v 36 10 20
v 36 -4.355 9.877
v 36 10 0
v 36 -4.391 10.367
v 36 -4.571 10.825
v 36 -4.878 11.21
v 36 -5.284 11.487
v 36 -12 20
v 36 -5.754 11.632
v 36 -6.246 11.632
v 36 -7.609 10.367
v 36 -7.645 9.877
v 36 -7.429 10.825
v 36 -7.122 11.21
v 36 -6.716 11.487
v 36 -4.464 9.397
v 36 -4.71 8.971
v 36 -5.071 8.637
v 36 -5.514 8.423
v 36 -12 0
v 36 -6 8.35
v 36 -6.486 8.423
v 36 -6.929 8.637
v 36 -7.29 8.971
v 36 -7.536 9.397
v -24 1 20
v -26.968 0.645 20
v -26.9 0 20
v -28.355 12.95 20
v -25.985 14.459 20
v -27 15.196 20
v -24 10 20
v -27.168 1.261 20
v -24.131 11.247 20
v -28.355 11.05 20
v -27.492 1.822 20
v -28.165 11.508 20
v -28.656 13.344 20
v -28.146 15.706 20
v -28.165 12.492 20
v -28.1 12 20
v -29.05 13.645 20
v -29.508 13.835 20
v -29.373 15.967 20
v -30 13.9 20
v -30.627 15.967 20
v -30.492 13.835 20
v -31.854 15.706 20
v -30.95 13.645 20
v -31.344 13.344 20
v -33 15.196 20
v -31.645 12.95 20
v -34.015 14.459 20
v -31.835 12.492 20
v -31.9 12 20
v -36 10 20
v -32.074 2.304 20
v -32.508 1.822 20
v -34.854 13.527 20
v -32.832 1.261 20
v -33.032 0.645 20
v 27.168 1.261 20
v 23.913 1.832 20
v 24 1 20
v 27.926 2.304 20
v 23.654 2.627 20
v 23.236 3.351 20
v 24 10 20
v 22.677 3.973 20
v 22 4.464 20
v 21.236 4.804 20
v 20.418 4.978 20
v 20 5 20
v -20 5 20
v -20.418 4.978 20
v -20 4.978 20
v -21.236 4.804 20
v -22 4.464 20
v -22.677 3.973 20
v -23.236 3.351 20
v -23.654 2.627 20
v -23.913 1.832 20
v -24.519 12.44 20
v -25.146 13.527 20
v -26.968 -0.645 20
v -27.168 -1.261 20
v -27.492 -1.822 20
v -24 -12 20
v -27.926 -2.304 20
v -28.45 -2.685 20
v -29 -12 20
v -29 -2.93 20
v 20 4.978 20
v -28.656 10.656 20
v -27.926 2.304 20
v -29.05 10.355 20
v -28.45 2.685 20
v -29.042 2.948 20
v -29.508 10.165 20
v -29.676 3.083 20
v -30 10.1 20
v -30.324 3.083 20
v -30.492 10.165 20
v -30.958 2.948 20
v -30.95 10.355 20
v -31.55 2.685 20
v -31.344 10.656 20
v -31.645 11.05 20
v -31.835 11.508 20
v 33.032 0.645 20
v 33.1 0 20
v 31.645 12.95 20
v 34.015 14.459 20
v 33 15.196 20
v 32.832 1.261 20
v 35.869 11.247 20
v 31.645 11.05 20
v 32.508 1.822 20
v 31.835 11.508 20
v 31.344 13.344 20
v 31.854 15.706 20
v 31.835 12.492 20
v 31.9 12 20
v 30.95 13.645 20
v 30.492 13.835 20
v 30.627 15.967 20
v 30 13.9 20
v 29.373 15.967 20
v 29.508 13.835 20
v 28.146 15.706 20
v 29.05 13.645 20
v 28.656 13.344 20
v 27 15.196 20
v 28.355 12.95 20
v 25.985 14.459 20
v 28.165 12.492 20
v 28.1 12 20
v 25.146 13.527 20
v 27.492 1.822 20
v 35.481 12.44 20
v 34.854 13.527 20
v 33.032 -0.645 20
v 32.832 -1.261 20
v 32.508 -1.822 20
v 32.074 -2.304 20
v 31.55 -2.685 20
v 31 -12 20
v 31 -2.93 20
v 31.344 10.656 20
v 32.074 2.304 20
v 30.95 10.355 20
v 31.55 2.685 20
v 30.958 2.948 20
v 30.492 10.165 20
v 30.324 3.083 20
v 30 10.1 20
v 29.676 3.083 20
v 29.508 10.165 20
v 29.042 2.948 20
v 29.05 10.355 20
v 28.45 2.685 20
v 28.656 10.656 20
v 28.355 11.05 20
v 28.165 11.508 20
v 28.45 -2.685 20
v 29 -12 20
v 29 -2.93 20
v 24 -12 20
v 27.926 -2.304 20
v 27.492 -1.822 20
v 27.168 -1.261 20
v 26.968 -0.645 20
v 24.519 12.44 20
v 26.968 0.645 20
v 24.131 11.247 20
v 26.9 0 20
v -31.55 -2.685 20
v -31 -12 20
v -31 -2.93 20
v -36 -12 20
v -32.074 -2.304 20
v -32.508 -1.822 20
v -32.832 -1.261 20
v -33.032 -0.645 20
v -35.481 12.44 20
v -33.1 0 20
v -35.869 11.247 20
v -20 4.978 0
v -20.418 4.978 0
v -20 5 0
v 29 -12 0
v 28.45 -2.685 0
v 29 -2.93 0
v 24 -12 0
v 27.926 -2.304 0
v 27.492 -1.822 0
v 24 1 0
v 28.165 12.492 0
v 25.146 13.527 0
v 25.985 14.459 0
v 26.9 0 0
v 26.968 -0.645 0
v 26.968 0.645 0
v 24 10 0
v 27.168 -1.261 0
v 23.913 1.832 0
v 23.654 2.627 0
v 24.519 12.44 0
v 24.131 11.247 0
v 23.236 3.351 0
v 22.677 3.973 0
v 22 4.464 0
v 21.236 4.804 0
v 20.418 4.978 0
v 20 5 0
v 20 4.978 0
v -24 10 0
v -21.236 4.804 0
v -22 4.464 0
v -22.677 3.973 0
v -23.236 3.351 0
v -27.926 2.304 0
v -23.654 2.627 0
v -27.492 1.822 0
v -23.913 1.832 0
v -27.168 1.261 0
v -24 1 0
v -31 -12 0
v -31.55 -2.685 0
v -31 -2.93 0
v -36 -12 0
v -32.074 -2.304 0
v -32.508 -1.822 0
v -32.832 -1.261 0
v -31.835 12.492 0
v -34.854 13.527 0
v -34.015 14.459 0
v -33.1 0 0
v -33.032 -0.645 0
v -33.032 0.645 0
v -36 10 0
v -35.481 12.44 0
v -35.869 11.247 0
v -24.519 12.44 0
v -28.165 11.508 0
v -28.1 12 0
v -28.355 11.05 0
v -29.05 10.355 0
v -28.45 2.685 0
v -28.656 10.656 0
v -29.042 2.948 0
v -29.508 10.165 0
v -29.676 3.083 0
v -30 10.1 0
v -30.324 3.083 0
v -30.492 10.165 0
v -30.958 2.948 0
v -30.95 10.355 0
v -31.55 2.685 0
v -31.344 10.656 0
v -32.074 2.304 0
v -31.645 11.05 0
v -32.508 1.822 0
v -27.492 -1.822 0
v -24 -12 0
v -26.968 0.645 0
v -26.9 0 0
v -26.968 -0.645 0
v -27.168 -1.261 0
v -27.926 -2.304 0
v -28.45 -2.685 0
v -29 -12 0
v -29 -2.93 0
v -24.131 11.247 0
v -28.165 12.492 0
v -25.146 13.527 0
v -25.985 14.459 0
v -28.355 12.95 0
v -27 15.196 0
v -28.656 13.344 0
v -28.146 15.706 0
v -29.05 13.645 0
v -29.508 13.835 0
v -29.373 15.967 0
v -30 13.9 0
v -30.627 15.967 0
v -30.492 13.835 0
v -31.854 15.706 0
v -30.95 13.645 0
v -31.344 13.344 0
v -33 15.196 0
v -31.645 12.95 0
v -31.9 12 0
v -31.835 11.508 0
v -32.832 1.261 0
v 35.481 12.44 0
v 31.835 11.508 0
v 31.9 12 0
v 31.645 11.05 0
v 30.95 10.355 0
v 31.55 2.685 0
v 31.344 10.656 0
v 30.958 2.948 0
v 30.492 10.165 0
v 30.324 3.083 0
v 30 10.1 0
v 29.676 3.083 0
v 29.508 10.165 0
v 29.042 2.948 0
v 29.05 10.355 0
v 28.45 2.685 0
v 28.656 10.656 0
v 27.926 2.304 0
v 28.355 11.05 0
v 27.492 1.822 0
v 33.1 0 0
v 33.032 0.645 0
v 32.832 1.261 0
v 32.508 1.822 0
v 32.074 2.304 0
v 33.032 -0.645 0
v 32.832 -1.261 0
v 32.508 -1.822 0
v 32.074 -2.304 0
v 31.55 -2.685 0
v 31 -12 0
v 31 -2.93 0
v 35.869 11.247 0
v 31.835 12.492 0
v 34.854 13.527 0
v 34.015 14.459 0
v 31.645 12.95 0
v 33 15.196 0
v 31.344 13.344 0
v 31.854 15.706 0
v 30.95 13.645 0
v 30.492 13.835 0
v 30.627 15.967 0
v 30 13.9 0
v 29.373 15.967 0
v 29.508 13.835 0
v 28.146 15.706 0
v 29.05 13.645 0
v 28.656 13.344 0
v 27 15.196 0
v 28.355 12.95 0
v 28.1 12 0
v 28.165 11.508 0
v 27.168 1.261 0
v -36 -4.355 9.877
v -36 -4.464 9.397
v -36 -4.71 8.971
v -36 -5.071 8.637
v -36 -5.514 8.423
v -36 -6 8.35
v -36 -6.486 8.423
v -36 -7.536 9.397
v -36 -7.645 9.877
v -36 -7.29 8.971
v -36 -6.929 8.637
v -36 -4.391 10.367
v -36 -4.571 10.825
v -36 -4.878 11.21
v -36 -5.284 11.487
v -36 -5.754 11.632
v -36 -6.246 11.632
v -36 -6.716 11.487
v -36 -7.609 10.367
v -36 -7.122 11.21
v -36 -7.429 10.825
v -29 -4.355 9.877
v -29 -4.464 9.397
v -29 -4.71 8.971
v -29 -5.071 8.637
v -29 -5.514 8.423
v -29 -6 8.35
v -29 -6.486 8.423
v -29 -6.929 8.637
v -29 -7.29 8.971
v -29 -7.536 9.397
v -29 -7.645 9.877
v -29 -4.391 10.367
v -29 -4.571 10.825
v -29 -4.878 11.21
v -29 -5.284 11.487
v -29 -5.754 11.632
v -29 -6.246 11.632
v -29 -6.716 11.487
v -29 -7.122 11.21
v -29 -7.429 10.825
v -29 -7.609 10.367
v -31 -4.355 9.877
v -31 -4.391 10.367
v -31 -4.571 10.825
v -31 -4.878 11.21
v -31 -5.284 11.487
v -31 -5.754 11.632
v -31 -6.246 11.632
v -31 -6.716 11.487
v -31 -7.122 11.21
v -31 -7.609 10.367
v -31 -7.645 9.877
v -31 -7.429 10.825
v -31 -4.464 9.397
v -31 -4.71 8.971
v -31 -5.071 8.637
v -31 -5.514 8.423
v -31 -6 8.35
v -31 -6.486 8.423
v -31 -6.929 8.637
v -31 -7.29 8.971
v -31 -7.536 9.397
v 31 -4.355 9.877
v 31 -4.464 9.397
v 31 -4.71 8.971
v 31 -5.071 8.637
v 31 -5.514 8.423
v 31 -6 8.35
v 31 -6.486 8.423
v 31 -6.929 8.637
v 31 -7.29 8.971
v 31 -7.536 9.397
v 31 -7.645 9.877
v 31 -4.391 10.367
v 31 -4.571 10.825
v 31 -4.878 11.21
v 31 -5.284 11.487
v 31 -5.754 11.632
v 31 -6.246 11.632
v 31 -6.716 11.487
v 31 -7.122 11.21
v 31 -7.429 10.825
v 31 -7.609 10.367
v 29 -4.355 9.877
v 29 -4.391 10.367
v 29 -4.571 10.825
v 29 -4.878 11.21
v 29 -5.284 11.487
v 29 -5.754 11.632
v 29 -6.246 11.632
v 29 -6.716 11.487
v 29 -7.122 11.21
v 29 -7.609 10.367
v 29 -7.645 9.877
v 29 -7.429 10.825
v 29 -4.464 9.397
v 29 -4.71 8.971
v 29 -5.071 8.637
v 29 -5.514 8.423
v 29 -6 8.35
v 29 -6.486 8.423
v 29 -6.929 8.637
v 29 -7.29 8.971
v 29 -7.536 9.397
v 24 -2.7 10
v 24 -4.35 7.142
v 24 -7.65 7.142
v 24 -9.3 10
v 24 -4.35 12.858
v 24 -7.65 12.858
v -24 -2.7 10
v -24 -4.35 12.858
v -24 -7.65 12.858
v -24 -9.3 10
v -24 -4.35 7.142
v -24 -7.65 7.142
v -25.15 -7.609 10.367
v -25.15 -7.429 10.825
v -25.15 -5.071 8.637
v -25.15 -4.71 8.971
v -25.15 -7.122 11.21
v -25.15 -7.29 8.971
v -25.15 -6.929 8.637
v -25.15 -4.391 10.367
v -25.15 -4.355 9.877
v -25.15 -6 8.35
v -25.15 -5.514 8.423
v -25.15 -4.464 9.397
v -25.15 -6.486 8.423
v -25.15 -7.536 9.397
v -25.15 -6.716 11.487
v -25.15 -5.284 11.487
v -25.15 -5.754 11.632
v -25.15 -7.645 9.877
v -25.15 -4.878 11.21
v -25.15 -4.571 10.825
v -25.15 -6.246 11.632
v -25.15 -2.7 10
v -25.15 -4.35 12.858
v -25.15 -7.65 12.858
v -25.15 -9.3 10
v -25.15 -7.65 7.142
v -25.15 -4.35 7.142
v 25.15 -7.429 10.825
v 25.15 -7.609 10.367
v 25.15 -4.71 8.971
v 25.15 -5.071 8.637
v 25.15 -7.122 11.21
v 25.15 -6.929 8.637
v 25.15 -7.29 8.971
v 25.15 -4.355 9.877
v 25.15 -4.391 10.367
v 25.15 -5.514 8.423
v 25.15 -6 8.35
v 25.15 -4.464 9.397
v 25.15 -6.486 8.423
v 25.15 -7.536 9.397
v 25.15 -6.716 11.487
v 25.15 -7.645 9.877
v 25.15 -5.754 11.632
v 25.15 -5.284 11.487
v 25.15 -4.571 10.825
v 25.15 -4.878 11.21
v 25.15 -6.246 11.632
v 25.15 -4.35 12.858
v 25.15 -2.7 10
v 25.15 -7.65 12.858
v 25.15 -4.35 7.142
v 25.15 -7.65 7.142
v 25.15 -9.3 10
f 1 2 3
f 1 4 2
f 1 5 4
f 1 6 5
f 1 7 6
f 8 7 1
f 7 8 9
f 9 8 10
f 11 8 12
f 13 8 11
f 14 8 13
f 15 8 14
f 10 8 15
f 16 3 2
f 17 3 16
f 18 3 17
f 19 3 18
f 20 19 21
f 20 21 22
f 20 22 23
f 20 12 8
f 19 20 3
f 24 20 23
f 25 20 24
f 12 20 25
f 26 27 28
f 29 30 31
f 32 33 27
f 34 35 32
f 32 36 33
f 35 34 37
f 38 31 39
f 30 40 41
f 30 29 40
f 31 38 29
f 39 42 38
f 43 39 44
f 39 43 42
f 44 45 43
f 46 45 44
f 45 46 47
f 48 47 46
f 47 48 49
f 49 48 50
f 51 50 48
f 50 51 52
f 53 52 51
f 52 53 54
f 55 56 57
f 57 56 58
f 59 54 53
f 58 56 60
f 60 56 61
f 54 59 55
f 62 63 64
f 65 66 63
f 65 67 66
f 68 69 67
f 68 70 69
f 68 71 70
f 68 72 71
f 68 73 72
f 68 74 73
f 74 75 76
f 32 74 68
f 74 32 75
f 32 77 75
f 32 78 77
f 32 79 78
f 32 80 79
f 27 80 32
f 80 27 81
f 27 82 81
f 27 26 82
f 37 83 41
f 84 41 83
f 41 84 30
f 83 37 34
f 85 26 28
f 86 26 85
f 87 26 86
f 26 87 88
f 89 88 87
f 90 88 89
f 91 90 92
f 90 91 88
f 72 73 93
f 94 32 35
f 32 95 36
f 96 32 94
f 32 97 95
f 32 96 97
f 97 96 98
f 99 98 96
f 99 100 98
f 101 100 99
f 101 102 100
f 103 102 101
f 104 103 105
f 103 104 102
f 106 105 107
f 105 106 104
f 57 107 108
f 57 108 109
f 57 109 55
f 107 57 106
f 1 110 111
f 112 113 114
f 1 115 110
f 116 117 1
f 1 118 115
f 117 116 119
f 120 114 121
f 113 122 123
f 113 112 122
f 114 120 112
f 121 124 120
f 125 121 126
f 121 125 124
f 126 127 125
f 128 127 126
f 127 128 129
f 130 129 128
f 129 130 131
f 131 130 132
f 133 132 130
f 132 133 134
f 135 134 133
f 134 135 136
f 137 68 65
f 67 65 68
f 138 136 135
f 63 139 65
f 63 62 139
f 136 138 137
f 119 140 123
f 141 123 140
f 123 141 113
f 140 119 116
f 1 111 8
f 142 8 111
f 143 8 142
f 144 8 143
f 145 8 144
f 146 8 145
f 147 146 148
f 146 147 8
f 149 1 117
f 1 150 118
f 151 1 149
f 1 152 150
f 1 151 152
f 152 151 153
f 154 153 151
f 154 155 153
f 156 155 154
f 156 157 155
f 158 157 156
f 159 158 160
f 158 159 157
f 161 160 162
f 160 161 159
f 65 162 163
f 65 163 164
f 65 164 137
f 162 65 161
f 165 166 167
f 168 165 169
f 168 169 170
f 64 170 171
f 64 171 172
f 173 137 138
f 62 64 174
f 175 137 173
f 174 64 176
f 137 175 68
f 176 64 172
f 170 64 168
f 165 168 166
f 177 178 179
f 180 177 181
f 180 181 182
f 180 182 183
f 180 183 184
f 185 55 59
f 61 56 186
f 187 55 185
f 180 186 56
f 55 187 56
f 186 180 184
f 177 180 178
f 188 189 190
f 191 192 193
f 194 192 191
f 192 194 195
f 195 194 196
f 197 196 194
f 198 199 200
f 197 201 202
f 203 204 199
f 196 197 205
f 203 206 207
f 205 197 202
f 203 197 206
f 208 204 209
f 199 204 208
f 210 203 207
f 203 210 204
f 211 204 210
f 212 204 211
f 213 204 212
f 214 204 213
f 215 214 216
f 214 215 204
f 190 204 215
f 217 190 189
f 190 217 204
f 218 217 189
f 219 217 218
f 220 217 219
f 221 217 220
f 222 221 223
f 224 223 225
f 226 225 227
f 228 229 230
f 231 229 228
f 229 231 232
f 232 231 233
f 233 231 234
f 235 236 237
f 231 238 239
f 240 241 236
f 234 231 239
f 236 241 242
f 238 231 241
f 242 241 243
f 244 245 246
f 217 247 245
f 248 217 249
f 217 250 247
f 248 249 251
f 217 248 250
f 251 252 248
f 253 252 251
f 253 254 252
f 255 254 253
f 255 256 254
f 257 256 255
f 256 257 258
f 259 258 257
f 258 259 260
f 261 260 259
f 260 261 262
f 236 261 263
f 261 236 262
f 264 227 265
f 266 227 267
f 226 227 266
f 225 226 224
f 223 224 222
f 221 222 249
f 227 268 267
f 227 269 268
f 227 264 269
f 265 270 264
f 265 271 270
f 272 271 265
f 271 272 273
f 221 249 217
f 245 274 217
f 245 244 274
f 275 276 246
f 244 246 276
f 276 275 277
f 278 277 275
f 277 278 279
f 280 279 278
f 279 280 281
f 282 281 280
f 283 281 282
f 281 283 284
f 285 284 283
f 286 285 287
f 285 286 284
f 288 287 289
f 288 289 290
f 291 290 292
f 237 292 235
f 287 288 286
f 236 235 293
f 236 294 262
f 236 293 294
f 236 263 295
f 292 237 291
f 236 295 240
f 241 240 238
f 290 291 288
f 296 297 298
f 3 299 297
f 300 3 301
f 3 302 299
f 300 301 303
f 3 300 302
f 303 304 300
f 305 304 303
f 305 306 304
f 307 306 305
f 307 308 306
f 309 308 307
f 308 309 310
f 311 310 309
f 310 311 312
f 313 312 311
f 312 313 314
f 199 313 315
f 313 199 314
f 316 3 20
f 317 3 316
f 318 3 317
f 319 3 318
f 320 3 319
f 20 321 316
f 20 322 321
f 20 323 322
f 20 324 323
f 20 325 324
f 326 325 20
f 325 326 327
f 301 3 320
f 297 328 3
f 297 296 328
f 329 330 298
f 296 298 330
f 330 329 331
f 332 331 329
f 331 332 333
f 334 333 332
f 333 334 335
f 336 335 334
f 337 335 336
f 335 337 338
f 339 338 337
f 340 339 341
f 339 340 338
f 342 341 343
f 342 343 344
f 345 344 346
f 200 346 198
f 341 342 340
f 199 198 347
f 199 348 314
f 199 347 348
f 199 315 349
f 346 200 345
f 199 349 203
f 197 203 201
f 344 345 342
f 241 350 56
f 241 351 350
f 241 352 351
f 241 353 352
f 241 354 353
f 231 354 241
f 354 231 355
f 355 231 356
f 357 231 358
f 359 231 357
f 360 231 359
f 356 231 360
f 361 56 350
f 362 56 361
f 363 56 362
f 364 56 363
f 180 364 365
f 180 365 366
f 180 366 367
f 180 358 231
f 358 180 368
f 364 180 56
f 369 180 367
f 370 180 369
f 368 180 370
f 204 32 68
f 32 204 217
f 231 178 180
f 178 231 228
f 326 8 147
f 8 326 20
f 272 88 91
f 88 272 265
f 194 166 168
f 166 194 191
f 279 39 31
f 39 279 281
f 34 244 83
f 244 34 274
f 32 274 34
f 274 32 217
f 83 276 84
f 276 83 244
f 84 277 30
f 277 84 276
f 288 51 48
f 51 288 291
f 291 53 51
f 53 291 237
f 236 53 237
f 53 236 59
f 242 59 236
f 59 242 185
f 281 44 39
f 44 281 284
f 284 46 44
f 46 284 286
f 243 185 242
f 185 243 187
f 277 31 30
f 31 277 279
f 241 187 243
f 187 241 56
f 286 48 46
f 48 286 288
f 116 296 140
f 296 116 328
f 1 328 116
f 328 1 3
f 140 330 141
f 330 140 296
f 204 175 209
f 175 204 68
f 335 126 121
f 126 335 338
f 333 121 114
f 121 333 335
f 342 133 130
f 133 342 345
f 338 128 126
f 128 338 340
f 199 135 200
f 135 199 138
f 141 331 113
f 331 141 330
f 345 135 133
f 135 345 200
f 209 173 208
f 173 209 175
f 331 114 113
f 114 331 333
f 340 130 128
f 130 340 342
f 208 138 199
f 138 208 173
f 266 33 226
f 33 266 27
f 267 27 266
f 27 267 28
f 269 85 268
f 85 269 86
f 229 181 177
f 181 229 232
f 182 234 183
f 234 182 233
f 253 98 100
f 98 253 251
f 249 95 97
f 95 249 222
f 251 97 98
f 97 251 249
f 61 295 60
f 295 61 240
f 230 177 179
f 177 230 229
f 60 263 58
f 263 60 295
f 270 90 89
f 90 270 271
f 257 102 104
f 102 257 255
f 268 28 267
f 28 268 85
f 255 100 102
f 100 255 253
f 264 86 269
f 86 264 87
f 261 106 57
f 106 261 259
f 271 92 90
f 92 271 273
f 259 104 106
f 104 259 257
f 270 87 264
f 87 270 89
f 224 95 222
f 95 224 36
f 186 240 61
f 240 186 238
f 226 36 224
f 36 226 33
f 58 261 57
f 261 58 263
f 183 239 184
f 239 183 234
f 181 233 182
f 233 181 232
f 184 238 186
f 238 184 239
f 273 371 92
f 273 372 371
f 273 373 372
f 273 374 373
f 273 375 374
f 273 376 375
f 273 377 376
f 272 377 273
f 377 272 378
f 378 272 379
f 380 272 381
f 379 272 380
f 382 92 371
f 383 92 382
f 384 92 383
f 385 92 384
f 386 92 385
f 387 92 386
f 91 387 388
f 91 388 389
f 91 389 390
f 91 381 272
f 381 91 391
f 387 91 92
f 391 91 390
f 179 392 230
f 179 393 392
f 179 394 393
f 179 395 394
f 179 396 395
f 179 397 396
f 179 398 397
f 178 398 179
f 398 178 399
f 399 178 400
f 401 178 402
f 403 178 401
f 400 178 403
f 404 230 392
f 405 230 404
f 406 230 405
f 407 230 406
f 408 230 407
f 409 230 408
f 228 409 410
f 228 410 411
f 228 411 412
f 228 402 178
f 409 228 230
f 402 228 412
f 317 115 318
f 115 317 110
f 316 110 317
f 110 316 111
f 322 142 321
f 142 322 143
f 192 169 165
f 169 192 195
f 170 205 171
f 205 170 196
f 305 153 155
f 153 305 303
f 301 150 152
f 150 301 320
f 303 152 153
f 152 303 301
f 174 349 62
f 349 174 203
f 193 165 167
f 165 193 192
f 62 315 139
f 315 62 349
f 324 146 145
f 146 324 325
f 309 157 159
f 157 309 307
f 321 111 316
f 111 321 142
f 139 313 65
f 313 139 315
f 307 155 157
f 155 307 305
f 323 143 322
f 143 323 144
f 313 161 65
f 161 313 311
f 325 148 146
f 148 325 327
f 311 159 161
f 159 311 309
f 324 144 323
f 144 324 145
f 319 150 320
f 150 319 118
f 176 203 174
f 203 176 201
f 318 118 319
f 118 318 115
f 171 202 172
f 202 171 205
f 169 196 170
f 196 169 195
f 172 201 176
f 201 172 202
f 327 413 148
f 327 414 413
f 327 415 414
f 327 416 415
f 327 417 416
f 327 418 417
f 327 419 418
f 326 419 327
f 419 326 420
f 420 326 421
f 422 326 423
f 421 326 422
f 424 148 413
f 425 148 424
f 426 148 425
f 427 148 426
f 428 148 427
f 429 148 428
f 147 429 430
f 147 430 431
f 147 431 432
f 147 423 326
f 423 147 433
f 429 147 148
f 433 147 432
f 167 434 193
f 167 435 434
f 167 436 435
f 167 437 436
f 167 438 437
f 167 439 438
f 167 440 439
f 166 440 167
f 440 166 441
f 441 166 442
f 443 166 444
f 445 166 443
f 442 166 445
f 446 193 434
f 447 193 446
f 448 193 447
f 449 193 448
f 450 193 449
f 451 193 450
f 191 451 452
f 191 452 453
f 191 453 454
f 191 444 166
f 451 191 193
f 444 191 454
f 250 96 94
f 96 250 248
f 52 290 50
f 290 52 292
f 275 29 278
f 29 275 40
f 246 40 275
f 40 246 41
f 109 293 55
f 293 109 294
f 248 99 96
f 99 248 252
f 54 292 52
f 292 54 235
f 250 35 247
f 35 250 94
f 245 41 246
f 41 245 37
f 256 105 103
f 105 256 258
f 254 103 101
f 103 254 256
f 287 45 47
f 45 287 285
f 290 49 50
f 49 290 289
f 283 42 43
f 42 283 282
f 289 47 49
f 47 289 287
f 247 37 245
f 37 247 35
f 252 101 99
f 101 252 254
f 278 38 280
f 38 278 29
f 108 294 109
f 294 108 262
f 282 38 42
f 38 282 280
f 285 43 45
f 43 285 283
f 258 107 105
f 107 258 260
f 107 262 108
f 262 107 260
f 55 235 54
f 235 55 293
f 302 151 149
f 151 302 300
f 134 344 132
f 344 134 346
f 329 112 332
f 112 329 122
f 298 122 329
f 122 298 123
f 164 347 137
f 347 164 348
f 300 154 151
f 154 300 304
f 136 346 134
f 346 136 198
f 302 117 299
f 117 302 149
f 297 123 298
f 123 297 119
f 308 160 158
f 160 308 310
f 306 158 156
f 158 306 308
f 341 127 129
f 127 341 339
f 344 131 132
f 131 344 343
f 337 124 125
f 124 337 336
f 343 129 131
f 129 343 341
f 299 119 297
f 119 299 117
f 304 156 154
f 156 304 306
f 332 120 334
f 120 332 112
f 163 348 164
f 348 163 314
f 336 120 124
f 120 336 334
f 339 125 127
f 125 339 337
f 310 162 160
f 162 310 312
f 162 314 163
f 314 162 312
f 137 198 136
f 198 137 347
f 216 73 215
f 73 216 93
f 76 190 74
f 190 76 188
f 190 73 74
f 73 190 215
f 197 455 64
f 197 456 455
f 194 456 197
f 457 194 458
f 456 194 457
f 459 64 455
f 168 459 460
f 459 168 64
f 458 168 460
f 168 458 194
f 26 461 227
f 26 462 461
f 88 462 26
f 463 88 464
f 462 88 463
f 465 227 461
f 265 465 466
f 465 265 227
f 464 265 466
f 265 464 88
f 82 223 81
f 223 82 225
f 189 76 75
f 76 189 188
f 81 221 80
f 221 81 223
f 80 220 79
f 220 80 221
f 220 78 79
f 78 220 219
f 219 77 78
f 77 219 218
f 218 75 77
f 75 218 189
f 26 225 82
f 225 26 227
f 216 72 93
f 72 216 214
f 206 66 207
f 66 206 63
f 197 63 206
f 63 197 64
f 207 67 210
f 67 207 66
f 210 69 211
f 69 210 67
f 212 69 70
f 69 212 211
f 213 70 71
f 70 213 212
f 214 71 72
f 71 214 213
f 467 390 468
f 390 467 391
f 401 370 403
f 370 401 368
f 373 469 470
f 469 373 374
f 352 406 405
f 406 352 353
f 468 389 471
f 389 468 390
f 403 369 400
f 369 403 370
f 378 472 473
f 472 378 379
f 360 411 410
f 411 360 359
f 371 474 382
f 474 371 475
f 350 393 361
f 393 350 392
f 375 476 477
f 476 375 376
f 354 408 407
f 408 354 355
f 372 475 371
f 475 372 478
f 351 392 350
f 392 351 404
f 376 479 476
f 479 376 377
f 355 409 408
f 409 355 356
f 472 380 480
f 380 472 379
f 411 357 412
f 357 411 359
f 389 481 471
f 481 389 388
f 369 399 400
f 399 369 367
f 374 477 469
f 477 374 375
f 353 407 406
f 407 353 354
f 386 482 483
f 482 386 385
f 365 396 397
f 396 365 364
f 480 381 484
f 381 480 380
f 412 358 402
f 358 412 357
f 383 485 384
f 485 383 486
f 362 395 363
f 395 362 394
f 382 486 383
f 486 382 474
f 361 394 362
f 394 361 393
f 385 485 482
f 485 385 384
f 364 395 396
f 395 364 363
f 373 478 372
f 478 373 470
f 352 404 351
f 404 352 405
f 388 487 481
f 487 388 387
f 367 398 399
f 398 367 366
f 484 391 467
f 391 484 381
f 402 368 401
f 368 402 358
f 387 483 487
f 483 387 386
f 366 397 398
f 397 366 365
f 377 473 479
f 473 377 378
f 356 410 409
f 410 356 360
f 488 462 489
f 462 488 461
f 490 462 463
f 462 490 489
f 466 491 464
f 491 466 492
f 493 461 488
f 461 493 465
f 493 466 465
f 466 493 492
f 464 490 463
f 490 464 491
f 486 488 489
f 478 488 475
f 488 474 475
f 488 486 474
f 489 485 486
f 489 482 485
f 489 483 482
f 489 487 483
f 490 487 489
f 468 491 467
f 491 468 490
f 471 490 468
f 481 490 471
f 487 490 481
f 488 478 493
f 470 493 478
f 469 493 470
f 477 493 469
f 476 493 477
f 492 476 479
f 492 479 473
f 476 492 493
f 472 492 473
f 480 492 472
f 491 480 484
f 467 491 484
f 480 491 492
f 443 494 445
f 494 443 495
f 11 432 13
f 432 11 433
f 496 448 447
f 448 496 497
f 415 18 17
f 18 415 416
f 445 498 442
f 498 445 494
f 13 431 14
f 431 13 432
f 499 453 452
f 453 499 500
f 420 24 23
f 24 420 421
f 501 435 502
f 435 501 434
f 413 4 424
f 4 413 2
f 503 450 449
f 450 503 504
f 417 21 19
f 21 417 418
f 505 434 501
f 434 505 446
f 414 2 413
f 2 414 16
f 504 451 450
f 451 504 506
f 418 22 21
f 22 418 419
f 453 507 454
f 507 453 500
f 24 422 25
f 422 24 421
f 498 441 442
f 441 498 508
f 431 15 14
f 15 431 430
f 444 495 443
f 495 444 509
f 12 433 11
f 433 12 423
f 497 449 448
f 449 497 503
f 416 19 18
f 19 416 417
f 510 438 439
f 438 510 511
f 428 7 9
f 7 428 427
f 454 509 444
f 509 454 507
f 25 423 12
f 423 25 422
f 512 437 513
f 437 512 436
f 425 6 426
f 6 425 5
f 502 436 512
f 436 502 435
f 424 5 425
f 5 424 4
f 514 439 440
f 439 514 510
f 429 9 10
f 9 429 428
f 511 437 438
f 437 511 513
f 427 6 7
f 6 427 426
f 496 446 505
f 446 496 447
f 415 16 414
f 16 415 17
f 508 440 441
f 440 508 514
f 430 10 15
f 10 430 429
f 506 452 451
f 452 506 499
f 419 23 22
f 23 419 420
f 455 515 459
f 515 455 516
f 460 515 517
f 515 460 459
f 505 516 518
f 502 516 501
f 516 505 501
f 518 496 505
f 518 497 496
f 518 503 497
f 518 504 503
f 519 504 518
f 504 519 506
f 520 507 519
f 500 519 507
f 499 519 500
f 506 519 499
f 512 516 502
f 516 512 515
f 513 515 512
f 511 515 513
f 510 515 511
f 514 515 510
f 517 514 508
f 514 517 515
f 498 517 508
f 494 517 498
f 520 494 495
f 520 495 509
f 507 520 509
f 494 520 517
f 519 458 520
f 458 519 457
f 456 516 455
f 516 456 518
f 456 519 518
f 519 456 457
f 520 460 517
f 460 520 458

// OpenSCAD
$fa = 12;
$fs = 0.5;

w = 60; // Smooth rod distance (center to center)

module screws() {
  for (x = [-w/2, w/2]) {
    translate([x, 0, 0]) {
      // Push-through M3 screw hole.
      translate([0, -6, 0]) rotate([0, 90, 0])
	cylinder(r=1.65, h=20, center=true);
      // M3 nut holder.
      translate([-x/5, -6, 0])
	rotate([30, 0, 0]) rotate([0, 90, 0])
	cylinder(r=3.3, h=2.3, center=true, $fn=6);
    }
  }
}

module bracket(h) {
  difference() {

    union() {
      translate([0, -1, 0]) cube([w+12, 22, h], center=true);
      // Sandwich mount.
      translate([-w/2, 10, 0]) cylinder(r=6, h=h, center=true);
      translate([w/2, 10, 0]) cylinder(r=6, h=h, center=true);
    }

    // Sandwich mount.
    translate([-w/2, 12, 0]) cylinder(r=1.9, h=h+1, center=true);
    translate([w/2, 12, 0]) cylinder(r=1.9, h=h+1, center=true);

    // Smooth rod mounting slots.
    for (x = [-w/2, w/2]) {
      translate([x, 0, 0]) {
      	cylinder(r=3.1, h=h+1, center=true);
	    translate([0, -10, 0]) cube([2, 20, h+1], center=true);
      }
    }

    // Belt path.
    translate([0, -5, 0]) cube([w-20, 20, h+1], center=true);
    translate([0, -9, 0]) cube([w-12, 20, h+1], center=true);
    translate([-w/2+10, 1, 0]) cylinder(r=4, h=h+1, center=true);
    translate([w/2-10, 1, 0]) cylinder(r=4, h=h+1, center=true);
  }
}

translate([0, 0, 10]) 
difference() {
bracket(20);
screws();
}
